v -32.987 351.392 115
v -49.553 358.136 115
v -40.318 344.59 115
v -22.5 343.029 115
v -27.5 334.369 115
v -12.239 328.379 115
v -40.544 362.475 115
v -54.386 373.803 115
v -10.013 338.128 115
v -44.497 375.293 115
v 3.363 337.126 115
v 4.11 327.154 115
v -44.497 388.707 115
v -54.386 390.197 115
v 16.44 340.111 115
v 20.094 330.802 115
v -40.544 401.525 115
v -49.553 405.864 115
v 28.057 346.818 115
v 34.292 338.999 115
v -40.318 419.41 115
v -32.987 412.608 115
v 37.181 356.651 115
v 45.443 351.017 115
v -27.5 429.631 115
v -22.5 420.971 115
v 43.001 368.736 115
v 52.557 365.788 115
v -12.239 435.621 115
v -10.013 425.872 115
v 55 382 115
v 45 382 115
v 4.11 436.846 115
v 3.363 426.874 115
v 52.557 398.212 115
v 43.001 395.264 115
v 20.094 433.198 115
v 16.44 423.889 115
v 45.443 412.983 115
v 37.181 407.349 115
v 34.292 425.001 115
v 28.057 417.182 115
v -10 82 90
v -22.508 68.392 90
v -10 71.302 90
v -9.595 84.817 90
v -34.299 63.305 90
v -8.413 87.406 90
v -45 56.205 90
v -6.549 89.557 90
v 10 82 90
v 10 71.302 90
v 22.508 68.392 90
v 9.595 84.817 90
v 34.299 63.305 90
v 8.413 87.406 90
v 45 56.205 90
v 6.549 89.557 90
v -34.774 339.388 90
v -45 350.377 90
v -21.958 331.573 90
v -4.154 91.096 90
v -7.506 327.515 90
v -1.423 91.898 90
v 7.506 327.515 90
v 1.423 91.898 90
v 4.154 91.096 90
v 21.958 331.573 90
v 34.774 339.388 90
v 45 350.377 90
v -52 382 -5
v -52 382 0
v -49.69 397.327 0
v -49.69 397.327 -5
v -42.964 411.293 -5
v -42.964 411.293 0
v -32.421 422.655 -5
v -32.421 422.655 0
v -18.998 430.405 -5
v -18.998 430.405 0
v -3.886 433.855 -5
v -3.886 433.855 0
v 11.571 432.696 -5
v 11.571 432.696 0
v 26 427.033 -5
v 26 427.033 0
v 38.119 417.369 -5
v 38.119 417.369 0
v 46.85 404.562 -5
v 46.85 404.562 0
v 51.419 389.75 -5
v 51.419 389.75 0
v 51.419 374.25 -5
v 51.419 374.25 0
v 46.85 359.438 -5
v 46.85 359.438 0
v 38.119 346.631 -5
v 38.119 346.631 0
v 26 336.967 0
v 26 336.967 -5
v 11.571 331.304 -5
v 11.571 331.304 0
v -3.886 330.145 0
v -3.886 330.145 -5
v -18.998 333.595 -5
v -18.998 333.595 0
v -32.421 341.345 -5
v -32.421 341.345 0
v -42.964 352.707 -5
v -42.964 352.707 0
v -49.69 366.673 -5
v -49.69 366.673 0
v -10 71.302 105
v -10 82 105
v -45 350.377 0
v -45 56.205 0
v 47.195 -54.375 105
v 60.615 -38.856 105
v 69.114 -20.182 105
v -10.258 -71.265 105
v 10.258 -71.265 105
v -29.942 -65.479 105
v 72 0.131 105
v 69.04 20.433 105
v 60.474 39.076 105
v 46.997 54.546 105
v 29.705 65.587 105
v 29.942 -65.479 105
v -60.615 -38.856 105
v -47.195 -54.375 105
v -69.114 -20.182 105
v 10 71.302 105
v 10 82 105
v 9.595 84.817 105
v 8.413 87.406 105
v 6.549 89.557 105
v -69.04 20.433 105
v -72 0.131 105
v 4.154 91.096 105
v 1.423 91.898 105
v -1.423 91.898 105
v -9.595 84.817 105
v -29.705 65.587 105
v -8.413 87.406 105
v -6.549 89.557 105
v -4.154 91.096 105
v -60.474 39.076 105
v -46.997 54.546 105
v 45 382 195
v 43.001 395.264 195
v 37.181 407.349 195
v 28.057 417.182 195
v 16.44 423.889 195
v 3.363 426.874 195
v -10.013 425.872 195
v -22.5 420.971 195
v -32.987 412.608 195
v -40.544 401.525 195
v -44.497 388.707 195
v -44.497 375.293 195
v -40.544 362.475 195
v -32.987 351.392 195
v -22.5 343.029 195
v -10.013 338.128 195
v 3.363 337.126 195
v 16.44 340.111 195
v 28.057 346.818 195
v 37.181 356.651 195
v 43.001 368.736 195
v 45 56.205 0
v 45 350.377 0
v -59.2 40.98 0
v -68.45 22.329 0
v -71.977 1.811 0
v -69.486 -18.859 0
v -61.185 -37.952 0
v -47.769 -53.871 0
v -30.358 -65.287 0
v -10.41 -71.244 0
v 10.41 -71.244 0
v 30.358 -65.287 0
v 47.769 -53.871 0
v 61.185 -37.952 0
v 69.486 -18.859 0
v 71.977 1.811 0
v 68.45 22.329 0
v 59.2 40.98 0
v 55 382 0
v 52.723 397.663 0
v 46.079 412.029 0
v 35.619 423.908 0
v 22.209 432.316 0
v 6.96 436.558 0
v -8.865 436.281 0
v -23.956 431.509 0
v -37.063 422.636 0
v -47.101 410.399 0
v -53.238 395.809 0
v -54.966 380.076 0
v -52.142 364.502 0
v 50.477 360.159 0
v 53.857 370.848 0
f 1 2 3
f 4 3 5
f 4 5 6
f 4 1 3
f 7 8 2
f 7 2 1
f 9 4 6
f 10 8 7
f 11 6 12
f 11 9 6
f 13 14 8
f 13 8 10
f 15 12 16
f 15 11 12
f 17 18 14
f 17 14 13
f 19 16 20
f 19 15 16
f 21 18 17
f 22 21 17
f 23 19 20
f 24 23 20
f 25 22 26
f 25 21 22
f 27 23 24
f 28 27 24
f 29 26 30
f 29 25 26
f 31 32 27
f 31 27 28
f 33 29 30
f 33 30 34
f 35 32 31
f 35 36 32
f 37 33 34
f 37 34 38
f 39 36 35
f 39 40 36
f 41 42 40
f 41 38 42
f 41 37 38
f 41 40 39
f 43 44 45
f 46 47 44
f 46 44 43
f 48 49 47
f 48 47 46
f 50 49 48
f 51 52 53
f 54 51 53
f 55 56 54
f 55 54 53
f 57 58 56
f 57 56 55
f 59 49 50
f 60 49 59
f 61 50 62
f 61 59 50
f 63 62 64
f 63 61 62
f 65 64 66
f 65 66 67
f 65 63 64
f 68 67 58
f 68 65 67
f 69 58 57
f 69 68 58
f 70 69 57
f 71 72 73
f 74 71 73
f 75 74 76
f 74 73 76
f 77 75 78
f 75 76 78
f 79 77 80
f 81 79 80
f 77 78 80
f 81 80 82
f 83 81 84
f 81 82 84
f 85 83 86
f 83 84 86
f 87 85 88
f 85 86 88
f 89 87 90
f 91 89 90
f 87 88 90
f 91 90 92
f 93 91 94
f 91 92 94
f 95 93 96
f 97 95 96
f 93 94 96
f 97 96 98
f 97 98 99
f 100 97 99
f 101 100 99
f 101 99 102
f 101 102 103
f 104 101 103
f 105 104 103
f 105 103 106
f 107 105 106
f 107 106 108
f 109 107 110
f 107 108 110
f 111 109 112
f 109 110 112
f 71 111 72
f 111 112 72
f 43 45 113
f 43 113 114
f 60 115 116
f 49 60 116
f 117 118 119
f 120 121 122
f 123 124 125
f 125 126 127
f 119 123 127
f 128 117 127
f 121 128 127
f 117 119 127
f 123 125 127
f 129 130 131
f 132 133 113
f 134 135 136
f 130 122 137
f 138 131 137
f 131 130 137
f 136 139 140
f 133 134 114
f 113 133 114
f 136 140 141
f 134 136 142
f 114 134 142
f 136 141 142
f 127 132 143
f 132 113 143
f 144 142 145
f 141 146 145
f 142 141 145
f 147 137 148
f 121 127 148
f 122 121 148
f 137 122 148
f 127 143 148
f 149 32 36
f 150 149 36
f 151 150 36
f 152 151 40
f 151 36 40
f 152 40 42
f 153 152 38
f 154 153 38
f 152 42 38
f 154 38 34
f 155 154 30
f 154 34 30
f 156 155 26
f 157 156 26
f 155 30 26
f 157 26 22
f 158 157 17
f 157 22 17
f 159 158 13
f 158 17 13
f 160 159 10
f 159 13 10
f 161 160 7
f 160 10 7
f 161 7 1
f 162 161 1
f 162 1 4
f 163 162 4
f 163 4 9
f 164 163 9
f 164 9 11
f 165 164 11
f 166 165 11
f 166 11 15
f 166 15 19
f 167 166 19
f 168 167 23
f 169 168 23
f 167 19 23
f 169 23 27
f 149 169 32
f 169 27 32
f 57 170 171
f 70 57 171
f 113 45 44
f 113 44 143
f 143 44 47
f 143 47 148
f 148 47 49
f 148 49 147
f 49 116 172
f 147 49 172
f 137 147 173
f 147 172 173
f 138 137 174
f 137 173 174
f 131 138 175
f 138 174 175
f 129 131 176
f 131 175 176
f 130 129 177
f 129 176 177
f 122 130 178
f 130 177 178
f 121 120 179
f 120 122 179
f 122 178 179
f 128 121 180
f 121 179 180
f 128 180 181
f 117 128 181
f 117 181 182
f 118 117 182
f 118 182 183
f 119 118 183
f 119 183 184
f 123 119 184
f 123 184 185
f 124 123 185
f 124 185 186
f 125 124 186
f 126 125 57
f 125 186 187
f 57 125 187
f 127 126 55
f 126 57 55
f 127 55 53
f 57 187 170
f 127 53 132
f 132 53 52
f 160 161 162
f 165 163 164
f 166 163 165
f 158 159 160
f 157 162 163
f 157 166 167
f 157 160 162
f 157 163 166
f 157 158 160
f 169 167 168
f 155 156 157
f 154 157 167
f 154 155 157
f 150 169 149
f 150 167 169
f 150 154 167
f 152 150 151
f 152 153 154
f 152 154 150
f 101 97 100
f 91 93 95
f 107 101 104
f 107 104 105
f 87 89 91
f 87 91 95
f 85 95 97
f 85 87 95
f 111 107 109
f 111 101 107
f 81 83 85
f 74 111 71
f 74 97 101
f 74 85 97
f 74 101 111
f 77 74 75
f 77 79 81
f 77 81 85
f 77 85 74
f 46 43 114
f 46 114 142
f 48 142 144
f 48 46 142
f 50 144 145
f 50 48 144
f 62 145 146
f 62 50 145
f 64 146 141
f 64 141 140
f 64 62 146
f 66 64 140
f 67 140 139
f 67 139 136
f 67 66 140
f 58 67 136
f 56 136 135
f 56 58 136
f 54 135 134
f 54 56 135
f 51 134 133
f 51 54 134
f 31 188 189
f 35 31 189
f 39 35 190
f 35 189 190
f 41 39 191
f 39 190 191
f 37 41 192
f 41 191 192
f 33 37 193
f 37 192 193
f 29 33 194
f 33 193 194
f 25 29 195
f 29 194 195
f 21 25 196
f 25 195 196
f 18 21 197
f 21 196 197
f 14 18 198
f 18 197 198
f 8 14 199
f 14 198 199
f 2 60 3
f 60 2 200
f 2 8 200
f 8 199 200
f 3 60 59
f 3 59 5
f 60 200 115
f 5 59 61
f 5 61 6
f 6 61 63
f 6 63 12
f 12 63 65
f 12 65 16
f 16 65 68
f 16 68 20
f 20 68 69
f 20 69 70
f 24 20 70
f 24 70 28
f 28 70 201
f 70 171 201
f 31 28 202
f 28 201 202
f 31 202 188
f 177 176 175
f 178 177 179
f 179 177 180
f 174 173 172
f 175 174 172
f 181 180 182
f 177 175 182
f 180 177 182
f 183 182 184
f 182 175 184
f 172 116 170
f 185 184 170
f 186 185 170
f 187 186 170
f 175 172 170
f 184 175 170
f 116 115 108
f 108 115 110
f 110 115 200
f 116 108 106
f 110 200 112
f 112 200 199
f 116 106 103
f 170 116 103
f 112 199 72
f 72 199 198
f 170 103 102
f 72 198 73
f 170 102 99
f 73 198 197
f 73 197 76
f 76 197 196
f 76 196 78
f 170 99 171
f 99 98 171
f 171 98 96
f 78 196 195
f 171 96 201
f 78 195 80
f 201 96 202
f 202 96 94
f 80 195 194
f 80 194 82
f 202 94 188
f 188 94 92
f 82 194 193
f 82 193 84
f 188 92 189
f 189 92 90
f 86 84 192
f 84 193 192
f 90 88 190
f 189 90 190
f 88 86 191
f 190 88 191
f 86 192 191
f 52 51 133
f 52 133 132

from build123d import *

# Parameters (mm, degrees)
BOSS_EXTRUDE5_DEPTH  = 90
BOSS_EXTRUDE6_DEPTH  = 115
BOSS_EXTRUDE7_DEPTH  = 105
BOSS_EXTRUDE8_DEPTH  = 15
SKETCH17_R           = 45
BOSS_EXTRUDE9_DEPTH  = 80
SKETCH18_R           = 52
BOSS_EXTRUDE10_DEPTH = 5


with BuildPart() as part:
    # Sketch11 → Boss-Extrude5 (new body)
    with BuildSketch(Plane.XY):
        with BuildLine():
            ThreePointArc((-45, 56.204981986), (0, 72), (45, 56.204981986))
            Line((45, 56.204981986), (45, 350.377223398))
            ThreePointArc((45, 350.377223398), (0, 327), (-45, 350.377223398))
            Line((-45, 350.377223398), (-45, 56.204981986))
        make_face()
    extrude(amount=BOSS_EXTRUDE5_DEPTH)

    # Sketch11<3> → Boss-Extrude6 (add)
    with BuildSketch(Plane.XY):
        with BuildLine():
            ThreePointArc((-45, 350.377223398), (0, 327), (45, 350.377223398))
            ThreePointArc((45, 350.377223398), (52.440442409, 365.416876048), (55, 382))
            ThreePointArc((55, 382), (-16.583123952, 434.440442409), (-45, 350.377223398))
        make_face()
    extrude(amount=BOSS_EXTRUDE6_DEPTH)

    # Sketch11<4> → Boss-Extrude7 (add)
    with BuildSketch(Plane.XY):
        with BuildLine():
            ThreePointArc((72, 0), (64.899922958, 31.176914536), (45, 56.204981986))
            ThreePointArc((45, 56.204981986), (0, 72), (-45, 56.204981986))
            ThreePointArc((-45, 56.204981986), (-31.176914536, -64.899922958), (72, 0))
        make_face()
    extrude(amount=BOSS_EXTRUDE7_DEPTH)

    # Sketch13 → Boss-Extrude8 (add)
    with BuildSketch(Plane.XY.offset(90)):
        with BuildLine():
            Line((10, 82), (10, 71.30217388))
            Line((10, 71.30217388), (-10, 71.30217388))
            Line((-10, 71.30217388), (-10, 82))
            ThreePointArc((-10, 82), (0, 92), (10, 82))
        make_face()
    extrude(amount=BOSS_EXTRUDE8_DEPTH)

    # Sketch17 → Boss-Extrude9 (add)
    with BuildSketch(Plane.XY.offset(115)):
        with Locations((0, 382)):
            Circle(SKETCH17_R)
    extrude(amount=BOSS_EXTRUDE9_DEPTH)

    # Sketch18 → Boss-Extrude10 (add)
    with BuildSketch(Plane(origin=(0, 0, 0), x_dir=(-1, 0, 0), z_dir=(0, 0, -1))):
        with Locations((0, 382)):
            Circle(SKETCH18_R)
    extrude(amount=BOSS_EXTRUDE10_DEPTH)


solid = part.part
